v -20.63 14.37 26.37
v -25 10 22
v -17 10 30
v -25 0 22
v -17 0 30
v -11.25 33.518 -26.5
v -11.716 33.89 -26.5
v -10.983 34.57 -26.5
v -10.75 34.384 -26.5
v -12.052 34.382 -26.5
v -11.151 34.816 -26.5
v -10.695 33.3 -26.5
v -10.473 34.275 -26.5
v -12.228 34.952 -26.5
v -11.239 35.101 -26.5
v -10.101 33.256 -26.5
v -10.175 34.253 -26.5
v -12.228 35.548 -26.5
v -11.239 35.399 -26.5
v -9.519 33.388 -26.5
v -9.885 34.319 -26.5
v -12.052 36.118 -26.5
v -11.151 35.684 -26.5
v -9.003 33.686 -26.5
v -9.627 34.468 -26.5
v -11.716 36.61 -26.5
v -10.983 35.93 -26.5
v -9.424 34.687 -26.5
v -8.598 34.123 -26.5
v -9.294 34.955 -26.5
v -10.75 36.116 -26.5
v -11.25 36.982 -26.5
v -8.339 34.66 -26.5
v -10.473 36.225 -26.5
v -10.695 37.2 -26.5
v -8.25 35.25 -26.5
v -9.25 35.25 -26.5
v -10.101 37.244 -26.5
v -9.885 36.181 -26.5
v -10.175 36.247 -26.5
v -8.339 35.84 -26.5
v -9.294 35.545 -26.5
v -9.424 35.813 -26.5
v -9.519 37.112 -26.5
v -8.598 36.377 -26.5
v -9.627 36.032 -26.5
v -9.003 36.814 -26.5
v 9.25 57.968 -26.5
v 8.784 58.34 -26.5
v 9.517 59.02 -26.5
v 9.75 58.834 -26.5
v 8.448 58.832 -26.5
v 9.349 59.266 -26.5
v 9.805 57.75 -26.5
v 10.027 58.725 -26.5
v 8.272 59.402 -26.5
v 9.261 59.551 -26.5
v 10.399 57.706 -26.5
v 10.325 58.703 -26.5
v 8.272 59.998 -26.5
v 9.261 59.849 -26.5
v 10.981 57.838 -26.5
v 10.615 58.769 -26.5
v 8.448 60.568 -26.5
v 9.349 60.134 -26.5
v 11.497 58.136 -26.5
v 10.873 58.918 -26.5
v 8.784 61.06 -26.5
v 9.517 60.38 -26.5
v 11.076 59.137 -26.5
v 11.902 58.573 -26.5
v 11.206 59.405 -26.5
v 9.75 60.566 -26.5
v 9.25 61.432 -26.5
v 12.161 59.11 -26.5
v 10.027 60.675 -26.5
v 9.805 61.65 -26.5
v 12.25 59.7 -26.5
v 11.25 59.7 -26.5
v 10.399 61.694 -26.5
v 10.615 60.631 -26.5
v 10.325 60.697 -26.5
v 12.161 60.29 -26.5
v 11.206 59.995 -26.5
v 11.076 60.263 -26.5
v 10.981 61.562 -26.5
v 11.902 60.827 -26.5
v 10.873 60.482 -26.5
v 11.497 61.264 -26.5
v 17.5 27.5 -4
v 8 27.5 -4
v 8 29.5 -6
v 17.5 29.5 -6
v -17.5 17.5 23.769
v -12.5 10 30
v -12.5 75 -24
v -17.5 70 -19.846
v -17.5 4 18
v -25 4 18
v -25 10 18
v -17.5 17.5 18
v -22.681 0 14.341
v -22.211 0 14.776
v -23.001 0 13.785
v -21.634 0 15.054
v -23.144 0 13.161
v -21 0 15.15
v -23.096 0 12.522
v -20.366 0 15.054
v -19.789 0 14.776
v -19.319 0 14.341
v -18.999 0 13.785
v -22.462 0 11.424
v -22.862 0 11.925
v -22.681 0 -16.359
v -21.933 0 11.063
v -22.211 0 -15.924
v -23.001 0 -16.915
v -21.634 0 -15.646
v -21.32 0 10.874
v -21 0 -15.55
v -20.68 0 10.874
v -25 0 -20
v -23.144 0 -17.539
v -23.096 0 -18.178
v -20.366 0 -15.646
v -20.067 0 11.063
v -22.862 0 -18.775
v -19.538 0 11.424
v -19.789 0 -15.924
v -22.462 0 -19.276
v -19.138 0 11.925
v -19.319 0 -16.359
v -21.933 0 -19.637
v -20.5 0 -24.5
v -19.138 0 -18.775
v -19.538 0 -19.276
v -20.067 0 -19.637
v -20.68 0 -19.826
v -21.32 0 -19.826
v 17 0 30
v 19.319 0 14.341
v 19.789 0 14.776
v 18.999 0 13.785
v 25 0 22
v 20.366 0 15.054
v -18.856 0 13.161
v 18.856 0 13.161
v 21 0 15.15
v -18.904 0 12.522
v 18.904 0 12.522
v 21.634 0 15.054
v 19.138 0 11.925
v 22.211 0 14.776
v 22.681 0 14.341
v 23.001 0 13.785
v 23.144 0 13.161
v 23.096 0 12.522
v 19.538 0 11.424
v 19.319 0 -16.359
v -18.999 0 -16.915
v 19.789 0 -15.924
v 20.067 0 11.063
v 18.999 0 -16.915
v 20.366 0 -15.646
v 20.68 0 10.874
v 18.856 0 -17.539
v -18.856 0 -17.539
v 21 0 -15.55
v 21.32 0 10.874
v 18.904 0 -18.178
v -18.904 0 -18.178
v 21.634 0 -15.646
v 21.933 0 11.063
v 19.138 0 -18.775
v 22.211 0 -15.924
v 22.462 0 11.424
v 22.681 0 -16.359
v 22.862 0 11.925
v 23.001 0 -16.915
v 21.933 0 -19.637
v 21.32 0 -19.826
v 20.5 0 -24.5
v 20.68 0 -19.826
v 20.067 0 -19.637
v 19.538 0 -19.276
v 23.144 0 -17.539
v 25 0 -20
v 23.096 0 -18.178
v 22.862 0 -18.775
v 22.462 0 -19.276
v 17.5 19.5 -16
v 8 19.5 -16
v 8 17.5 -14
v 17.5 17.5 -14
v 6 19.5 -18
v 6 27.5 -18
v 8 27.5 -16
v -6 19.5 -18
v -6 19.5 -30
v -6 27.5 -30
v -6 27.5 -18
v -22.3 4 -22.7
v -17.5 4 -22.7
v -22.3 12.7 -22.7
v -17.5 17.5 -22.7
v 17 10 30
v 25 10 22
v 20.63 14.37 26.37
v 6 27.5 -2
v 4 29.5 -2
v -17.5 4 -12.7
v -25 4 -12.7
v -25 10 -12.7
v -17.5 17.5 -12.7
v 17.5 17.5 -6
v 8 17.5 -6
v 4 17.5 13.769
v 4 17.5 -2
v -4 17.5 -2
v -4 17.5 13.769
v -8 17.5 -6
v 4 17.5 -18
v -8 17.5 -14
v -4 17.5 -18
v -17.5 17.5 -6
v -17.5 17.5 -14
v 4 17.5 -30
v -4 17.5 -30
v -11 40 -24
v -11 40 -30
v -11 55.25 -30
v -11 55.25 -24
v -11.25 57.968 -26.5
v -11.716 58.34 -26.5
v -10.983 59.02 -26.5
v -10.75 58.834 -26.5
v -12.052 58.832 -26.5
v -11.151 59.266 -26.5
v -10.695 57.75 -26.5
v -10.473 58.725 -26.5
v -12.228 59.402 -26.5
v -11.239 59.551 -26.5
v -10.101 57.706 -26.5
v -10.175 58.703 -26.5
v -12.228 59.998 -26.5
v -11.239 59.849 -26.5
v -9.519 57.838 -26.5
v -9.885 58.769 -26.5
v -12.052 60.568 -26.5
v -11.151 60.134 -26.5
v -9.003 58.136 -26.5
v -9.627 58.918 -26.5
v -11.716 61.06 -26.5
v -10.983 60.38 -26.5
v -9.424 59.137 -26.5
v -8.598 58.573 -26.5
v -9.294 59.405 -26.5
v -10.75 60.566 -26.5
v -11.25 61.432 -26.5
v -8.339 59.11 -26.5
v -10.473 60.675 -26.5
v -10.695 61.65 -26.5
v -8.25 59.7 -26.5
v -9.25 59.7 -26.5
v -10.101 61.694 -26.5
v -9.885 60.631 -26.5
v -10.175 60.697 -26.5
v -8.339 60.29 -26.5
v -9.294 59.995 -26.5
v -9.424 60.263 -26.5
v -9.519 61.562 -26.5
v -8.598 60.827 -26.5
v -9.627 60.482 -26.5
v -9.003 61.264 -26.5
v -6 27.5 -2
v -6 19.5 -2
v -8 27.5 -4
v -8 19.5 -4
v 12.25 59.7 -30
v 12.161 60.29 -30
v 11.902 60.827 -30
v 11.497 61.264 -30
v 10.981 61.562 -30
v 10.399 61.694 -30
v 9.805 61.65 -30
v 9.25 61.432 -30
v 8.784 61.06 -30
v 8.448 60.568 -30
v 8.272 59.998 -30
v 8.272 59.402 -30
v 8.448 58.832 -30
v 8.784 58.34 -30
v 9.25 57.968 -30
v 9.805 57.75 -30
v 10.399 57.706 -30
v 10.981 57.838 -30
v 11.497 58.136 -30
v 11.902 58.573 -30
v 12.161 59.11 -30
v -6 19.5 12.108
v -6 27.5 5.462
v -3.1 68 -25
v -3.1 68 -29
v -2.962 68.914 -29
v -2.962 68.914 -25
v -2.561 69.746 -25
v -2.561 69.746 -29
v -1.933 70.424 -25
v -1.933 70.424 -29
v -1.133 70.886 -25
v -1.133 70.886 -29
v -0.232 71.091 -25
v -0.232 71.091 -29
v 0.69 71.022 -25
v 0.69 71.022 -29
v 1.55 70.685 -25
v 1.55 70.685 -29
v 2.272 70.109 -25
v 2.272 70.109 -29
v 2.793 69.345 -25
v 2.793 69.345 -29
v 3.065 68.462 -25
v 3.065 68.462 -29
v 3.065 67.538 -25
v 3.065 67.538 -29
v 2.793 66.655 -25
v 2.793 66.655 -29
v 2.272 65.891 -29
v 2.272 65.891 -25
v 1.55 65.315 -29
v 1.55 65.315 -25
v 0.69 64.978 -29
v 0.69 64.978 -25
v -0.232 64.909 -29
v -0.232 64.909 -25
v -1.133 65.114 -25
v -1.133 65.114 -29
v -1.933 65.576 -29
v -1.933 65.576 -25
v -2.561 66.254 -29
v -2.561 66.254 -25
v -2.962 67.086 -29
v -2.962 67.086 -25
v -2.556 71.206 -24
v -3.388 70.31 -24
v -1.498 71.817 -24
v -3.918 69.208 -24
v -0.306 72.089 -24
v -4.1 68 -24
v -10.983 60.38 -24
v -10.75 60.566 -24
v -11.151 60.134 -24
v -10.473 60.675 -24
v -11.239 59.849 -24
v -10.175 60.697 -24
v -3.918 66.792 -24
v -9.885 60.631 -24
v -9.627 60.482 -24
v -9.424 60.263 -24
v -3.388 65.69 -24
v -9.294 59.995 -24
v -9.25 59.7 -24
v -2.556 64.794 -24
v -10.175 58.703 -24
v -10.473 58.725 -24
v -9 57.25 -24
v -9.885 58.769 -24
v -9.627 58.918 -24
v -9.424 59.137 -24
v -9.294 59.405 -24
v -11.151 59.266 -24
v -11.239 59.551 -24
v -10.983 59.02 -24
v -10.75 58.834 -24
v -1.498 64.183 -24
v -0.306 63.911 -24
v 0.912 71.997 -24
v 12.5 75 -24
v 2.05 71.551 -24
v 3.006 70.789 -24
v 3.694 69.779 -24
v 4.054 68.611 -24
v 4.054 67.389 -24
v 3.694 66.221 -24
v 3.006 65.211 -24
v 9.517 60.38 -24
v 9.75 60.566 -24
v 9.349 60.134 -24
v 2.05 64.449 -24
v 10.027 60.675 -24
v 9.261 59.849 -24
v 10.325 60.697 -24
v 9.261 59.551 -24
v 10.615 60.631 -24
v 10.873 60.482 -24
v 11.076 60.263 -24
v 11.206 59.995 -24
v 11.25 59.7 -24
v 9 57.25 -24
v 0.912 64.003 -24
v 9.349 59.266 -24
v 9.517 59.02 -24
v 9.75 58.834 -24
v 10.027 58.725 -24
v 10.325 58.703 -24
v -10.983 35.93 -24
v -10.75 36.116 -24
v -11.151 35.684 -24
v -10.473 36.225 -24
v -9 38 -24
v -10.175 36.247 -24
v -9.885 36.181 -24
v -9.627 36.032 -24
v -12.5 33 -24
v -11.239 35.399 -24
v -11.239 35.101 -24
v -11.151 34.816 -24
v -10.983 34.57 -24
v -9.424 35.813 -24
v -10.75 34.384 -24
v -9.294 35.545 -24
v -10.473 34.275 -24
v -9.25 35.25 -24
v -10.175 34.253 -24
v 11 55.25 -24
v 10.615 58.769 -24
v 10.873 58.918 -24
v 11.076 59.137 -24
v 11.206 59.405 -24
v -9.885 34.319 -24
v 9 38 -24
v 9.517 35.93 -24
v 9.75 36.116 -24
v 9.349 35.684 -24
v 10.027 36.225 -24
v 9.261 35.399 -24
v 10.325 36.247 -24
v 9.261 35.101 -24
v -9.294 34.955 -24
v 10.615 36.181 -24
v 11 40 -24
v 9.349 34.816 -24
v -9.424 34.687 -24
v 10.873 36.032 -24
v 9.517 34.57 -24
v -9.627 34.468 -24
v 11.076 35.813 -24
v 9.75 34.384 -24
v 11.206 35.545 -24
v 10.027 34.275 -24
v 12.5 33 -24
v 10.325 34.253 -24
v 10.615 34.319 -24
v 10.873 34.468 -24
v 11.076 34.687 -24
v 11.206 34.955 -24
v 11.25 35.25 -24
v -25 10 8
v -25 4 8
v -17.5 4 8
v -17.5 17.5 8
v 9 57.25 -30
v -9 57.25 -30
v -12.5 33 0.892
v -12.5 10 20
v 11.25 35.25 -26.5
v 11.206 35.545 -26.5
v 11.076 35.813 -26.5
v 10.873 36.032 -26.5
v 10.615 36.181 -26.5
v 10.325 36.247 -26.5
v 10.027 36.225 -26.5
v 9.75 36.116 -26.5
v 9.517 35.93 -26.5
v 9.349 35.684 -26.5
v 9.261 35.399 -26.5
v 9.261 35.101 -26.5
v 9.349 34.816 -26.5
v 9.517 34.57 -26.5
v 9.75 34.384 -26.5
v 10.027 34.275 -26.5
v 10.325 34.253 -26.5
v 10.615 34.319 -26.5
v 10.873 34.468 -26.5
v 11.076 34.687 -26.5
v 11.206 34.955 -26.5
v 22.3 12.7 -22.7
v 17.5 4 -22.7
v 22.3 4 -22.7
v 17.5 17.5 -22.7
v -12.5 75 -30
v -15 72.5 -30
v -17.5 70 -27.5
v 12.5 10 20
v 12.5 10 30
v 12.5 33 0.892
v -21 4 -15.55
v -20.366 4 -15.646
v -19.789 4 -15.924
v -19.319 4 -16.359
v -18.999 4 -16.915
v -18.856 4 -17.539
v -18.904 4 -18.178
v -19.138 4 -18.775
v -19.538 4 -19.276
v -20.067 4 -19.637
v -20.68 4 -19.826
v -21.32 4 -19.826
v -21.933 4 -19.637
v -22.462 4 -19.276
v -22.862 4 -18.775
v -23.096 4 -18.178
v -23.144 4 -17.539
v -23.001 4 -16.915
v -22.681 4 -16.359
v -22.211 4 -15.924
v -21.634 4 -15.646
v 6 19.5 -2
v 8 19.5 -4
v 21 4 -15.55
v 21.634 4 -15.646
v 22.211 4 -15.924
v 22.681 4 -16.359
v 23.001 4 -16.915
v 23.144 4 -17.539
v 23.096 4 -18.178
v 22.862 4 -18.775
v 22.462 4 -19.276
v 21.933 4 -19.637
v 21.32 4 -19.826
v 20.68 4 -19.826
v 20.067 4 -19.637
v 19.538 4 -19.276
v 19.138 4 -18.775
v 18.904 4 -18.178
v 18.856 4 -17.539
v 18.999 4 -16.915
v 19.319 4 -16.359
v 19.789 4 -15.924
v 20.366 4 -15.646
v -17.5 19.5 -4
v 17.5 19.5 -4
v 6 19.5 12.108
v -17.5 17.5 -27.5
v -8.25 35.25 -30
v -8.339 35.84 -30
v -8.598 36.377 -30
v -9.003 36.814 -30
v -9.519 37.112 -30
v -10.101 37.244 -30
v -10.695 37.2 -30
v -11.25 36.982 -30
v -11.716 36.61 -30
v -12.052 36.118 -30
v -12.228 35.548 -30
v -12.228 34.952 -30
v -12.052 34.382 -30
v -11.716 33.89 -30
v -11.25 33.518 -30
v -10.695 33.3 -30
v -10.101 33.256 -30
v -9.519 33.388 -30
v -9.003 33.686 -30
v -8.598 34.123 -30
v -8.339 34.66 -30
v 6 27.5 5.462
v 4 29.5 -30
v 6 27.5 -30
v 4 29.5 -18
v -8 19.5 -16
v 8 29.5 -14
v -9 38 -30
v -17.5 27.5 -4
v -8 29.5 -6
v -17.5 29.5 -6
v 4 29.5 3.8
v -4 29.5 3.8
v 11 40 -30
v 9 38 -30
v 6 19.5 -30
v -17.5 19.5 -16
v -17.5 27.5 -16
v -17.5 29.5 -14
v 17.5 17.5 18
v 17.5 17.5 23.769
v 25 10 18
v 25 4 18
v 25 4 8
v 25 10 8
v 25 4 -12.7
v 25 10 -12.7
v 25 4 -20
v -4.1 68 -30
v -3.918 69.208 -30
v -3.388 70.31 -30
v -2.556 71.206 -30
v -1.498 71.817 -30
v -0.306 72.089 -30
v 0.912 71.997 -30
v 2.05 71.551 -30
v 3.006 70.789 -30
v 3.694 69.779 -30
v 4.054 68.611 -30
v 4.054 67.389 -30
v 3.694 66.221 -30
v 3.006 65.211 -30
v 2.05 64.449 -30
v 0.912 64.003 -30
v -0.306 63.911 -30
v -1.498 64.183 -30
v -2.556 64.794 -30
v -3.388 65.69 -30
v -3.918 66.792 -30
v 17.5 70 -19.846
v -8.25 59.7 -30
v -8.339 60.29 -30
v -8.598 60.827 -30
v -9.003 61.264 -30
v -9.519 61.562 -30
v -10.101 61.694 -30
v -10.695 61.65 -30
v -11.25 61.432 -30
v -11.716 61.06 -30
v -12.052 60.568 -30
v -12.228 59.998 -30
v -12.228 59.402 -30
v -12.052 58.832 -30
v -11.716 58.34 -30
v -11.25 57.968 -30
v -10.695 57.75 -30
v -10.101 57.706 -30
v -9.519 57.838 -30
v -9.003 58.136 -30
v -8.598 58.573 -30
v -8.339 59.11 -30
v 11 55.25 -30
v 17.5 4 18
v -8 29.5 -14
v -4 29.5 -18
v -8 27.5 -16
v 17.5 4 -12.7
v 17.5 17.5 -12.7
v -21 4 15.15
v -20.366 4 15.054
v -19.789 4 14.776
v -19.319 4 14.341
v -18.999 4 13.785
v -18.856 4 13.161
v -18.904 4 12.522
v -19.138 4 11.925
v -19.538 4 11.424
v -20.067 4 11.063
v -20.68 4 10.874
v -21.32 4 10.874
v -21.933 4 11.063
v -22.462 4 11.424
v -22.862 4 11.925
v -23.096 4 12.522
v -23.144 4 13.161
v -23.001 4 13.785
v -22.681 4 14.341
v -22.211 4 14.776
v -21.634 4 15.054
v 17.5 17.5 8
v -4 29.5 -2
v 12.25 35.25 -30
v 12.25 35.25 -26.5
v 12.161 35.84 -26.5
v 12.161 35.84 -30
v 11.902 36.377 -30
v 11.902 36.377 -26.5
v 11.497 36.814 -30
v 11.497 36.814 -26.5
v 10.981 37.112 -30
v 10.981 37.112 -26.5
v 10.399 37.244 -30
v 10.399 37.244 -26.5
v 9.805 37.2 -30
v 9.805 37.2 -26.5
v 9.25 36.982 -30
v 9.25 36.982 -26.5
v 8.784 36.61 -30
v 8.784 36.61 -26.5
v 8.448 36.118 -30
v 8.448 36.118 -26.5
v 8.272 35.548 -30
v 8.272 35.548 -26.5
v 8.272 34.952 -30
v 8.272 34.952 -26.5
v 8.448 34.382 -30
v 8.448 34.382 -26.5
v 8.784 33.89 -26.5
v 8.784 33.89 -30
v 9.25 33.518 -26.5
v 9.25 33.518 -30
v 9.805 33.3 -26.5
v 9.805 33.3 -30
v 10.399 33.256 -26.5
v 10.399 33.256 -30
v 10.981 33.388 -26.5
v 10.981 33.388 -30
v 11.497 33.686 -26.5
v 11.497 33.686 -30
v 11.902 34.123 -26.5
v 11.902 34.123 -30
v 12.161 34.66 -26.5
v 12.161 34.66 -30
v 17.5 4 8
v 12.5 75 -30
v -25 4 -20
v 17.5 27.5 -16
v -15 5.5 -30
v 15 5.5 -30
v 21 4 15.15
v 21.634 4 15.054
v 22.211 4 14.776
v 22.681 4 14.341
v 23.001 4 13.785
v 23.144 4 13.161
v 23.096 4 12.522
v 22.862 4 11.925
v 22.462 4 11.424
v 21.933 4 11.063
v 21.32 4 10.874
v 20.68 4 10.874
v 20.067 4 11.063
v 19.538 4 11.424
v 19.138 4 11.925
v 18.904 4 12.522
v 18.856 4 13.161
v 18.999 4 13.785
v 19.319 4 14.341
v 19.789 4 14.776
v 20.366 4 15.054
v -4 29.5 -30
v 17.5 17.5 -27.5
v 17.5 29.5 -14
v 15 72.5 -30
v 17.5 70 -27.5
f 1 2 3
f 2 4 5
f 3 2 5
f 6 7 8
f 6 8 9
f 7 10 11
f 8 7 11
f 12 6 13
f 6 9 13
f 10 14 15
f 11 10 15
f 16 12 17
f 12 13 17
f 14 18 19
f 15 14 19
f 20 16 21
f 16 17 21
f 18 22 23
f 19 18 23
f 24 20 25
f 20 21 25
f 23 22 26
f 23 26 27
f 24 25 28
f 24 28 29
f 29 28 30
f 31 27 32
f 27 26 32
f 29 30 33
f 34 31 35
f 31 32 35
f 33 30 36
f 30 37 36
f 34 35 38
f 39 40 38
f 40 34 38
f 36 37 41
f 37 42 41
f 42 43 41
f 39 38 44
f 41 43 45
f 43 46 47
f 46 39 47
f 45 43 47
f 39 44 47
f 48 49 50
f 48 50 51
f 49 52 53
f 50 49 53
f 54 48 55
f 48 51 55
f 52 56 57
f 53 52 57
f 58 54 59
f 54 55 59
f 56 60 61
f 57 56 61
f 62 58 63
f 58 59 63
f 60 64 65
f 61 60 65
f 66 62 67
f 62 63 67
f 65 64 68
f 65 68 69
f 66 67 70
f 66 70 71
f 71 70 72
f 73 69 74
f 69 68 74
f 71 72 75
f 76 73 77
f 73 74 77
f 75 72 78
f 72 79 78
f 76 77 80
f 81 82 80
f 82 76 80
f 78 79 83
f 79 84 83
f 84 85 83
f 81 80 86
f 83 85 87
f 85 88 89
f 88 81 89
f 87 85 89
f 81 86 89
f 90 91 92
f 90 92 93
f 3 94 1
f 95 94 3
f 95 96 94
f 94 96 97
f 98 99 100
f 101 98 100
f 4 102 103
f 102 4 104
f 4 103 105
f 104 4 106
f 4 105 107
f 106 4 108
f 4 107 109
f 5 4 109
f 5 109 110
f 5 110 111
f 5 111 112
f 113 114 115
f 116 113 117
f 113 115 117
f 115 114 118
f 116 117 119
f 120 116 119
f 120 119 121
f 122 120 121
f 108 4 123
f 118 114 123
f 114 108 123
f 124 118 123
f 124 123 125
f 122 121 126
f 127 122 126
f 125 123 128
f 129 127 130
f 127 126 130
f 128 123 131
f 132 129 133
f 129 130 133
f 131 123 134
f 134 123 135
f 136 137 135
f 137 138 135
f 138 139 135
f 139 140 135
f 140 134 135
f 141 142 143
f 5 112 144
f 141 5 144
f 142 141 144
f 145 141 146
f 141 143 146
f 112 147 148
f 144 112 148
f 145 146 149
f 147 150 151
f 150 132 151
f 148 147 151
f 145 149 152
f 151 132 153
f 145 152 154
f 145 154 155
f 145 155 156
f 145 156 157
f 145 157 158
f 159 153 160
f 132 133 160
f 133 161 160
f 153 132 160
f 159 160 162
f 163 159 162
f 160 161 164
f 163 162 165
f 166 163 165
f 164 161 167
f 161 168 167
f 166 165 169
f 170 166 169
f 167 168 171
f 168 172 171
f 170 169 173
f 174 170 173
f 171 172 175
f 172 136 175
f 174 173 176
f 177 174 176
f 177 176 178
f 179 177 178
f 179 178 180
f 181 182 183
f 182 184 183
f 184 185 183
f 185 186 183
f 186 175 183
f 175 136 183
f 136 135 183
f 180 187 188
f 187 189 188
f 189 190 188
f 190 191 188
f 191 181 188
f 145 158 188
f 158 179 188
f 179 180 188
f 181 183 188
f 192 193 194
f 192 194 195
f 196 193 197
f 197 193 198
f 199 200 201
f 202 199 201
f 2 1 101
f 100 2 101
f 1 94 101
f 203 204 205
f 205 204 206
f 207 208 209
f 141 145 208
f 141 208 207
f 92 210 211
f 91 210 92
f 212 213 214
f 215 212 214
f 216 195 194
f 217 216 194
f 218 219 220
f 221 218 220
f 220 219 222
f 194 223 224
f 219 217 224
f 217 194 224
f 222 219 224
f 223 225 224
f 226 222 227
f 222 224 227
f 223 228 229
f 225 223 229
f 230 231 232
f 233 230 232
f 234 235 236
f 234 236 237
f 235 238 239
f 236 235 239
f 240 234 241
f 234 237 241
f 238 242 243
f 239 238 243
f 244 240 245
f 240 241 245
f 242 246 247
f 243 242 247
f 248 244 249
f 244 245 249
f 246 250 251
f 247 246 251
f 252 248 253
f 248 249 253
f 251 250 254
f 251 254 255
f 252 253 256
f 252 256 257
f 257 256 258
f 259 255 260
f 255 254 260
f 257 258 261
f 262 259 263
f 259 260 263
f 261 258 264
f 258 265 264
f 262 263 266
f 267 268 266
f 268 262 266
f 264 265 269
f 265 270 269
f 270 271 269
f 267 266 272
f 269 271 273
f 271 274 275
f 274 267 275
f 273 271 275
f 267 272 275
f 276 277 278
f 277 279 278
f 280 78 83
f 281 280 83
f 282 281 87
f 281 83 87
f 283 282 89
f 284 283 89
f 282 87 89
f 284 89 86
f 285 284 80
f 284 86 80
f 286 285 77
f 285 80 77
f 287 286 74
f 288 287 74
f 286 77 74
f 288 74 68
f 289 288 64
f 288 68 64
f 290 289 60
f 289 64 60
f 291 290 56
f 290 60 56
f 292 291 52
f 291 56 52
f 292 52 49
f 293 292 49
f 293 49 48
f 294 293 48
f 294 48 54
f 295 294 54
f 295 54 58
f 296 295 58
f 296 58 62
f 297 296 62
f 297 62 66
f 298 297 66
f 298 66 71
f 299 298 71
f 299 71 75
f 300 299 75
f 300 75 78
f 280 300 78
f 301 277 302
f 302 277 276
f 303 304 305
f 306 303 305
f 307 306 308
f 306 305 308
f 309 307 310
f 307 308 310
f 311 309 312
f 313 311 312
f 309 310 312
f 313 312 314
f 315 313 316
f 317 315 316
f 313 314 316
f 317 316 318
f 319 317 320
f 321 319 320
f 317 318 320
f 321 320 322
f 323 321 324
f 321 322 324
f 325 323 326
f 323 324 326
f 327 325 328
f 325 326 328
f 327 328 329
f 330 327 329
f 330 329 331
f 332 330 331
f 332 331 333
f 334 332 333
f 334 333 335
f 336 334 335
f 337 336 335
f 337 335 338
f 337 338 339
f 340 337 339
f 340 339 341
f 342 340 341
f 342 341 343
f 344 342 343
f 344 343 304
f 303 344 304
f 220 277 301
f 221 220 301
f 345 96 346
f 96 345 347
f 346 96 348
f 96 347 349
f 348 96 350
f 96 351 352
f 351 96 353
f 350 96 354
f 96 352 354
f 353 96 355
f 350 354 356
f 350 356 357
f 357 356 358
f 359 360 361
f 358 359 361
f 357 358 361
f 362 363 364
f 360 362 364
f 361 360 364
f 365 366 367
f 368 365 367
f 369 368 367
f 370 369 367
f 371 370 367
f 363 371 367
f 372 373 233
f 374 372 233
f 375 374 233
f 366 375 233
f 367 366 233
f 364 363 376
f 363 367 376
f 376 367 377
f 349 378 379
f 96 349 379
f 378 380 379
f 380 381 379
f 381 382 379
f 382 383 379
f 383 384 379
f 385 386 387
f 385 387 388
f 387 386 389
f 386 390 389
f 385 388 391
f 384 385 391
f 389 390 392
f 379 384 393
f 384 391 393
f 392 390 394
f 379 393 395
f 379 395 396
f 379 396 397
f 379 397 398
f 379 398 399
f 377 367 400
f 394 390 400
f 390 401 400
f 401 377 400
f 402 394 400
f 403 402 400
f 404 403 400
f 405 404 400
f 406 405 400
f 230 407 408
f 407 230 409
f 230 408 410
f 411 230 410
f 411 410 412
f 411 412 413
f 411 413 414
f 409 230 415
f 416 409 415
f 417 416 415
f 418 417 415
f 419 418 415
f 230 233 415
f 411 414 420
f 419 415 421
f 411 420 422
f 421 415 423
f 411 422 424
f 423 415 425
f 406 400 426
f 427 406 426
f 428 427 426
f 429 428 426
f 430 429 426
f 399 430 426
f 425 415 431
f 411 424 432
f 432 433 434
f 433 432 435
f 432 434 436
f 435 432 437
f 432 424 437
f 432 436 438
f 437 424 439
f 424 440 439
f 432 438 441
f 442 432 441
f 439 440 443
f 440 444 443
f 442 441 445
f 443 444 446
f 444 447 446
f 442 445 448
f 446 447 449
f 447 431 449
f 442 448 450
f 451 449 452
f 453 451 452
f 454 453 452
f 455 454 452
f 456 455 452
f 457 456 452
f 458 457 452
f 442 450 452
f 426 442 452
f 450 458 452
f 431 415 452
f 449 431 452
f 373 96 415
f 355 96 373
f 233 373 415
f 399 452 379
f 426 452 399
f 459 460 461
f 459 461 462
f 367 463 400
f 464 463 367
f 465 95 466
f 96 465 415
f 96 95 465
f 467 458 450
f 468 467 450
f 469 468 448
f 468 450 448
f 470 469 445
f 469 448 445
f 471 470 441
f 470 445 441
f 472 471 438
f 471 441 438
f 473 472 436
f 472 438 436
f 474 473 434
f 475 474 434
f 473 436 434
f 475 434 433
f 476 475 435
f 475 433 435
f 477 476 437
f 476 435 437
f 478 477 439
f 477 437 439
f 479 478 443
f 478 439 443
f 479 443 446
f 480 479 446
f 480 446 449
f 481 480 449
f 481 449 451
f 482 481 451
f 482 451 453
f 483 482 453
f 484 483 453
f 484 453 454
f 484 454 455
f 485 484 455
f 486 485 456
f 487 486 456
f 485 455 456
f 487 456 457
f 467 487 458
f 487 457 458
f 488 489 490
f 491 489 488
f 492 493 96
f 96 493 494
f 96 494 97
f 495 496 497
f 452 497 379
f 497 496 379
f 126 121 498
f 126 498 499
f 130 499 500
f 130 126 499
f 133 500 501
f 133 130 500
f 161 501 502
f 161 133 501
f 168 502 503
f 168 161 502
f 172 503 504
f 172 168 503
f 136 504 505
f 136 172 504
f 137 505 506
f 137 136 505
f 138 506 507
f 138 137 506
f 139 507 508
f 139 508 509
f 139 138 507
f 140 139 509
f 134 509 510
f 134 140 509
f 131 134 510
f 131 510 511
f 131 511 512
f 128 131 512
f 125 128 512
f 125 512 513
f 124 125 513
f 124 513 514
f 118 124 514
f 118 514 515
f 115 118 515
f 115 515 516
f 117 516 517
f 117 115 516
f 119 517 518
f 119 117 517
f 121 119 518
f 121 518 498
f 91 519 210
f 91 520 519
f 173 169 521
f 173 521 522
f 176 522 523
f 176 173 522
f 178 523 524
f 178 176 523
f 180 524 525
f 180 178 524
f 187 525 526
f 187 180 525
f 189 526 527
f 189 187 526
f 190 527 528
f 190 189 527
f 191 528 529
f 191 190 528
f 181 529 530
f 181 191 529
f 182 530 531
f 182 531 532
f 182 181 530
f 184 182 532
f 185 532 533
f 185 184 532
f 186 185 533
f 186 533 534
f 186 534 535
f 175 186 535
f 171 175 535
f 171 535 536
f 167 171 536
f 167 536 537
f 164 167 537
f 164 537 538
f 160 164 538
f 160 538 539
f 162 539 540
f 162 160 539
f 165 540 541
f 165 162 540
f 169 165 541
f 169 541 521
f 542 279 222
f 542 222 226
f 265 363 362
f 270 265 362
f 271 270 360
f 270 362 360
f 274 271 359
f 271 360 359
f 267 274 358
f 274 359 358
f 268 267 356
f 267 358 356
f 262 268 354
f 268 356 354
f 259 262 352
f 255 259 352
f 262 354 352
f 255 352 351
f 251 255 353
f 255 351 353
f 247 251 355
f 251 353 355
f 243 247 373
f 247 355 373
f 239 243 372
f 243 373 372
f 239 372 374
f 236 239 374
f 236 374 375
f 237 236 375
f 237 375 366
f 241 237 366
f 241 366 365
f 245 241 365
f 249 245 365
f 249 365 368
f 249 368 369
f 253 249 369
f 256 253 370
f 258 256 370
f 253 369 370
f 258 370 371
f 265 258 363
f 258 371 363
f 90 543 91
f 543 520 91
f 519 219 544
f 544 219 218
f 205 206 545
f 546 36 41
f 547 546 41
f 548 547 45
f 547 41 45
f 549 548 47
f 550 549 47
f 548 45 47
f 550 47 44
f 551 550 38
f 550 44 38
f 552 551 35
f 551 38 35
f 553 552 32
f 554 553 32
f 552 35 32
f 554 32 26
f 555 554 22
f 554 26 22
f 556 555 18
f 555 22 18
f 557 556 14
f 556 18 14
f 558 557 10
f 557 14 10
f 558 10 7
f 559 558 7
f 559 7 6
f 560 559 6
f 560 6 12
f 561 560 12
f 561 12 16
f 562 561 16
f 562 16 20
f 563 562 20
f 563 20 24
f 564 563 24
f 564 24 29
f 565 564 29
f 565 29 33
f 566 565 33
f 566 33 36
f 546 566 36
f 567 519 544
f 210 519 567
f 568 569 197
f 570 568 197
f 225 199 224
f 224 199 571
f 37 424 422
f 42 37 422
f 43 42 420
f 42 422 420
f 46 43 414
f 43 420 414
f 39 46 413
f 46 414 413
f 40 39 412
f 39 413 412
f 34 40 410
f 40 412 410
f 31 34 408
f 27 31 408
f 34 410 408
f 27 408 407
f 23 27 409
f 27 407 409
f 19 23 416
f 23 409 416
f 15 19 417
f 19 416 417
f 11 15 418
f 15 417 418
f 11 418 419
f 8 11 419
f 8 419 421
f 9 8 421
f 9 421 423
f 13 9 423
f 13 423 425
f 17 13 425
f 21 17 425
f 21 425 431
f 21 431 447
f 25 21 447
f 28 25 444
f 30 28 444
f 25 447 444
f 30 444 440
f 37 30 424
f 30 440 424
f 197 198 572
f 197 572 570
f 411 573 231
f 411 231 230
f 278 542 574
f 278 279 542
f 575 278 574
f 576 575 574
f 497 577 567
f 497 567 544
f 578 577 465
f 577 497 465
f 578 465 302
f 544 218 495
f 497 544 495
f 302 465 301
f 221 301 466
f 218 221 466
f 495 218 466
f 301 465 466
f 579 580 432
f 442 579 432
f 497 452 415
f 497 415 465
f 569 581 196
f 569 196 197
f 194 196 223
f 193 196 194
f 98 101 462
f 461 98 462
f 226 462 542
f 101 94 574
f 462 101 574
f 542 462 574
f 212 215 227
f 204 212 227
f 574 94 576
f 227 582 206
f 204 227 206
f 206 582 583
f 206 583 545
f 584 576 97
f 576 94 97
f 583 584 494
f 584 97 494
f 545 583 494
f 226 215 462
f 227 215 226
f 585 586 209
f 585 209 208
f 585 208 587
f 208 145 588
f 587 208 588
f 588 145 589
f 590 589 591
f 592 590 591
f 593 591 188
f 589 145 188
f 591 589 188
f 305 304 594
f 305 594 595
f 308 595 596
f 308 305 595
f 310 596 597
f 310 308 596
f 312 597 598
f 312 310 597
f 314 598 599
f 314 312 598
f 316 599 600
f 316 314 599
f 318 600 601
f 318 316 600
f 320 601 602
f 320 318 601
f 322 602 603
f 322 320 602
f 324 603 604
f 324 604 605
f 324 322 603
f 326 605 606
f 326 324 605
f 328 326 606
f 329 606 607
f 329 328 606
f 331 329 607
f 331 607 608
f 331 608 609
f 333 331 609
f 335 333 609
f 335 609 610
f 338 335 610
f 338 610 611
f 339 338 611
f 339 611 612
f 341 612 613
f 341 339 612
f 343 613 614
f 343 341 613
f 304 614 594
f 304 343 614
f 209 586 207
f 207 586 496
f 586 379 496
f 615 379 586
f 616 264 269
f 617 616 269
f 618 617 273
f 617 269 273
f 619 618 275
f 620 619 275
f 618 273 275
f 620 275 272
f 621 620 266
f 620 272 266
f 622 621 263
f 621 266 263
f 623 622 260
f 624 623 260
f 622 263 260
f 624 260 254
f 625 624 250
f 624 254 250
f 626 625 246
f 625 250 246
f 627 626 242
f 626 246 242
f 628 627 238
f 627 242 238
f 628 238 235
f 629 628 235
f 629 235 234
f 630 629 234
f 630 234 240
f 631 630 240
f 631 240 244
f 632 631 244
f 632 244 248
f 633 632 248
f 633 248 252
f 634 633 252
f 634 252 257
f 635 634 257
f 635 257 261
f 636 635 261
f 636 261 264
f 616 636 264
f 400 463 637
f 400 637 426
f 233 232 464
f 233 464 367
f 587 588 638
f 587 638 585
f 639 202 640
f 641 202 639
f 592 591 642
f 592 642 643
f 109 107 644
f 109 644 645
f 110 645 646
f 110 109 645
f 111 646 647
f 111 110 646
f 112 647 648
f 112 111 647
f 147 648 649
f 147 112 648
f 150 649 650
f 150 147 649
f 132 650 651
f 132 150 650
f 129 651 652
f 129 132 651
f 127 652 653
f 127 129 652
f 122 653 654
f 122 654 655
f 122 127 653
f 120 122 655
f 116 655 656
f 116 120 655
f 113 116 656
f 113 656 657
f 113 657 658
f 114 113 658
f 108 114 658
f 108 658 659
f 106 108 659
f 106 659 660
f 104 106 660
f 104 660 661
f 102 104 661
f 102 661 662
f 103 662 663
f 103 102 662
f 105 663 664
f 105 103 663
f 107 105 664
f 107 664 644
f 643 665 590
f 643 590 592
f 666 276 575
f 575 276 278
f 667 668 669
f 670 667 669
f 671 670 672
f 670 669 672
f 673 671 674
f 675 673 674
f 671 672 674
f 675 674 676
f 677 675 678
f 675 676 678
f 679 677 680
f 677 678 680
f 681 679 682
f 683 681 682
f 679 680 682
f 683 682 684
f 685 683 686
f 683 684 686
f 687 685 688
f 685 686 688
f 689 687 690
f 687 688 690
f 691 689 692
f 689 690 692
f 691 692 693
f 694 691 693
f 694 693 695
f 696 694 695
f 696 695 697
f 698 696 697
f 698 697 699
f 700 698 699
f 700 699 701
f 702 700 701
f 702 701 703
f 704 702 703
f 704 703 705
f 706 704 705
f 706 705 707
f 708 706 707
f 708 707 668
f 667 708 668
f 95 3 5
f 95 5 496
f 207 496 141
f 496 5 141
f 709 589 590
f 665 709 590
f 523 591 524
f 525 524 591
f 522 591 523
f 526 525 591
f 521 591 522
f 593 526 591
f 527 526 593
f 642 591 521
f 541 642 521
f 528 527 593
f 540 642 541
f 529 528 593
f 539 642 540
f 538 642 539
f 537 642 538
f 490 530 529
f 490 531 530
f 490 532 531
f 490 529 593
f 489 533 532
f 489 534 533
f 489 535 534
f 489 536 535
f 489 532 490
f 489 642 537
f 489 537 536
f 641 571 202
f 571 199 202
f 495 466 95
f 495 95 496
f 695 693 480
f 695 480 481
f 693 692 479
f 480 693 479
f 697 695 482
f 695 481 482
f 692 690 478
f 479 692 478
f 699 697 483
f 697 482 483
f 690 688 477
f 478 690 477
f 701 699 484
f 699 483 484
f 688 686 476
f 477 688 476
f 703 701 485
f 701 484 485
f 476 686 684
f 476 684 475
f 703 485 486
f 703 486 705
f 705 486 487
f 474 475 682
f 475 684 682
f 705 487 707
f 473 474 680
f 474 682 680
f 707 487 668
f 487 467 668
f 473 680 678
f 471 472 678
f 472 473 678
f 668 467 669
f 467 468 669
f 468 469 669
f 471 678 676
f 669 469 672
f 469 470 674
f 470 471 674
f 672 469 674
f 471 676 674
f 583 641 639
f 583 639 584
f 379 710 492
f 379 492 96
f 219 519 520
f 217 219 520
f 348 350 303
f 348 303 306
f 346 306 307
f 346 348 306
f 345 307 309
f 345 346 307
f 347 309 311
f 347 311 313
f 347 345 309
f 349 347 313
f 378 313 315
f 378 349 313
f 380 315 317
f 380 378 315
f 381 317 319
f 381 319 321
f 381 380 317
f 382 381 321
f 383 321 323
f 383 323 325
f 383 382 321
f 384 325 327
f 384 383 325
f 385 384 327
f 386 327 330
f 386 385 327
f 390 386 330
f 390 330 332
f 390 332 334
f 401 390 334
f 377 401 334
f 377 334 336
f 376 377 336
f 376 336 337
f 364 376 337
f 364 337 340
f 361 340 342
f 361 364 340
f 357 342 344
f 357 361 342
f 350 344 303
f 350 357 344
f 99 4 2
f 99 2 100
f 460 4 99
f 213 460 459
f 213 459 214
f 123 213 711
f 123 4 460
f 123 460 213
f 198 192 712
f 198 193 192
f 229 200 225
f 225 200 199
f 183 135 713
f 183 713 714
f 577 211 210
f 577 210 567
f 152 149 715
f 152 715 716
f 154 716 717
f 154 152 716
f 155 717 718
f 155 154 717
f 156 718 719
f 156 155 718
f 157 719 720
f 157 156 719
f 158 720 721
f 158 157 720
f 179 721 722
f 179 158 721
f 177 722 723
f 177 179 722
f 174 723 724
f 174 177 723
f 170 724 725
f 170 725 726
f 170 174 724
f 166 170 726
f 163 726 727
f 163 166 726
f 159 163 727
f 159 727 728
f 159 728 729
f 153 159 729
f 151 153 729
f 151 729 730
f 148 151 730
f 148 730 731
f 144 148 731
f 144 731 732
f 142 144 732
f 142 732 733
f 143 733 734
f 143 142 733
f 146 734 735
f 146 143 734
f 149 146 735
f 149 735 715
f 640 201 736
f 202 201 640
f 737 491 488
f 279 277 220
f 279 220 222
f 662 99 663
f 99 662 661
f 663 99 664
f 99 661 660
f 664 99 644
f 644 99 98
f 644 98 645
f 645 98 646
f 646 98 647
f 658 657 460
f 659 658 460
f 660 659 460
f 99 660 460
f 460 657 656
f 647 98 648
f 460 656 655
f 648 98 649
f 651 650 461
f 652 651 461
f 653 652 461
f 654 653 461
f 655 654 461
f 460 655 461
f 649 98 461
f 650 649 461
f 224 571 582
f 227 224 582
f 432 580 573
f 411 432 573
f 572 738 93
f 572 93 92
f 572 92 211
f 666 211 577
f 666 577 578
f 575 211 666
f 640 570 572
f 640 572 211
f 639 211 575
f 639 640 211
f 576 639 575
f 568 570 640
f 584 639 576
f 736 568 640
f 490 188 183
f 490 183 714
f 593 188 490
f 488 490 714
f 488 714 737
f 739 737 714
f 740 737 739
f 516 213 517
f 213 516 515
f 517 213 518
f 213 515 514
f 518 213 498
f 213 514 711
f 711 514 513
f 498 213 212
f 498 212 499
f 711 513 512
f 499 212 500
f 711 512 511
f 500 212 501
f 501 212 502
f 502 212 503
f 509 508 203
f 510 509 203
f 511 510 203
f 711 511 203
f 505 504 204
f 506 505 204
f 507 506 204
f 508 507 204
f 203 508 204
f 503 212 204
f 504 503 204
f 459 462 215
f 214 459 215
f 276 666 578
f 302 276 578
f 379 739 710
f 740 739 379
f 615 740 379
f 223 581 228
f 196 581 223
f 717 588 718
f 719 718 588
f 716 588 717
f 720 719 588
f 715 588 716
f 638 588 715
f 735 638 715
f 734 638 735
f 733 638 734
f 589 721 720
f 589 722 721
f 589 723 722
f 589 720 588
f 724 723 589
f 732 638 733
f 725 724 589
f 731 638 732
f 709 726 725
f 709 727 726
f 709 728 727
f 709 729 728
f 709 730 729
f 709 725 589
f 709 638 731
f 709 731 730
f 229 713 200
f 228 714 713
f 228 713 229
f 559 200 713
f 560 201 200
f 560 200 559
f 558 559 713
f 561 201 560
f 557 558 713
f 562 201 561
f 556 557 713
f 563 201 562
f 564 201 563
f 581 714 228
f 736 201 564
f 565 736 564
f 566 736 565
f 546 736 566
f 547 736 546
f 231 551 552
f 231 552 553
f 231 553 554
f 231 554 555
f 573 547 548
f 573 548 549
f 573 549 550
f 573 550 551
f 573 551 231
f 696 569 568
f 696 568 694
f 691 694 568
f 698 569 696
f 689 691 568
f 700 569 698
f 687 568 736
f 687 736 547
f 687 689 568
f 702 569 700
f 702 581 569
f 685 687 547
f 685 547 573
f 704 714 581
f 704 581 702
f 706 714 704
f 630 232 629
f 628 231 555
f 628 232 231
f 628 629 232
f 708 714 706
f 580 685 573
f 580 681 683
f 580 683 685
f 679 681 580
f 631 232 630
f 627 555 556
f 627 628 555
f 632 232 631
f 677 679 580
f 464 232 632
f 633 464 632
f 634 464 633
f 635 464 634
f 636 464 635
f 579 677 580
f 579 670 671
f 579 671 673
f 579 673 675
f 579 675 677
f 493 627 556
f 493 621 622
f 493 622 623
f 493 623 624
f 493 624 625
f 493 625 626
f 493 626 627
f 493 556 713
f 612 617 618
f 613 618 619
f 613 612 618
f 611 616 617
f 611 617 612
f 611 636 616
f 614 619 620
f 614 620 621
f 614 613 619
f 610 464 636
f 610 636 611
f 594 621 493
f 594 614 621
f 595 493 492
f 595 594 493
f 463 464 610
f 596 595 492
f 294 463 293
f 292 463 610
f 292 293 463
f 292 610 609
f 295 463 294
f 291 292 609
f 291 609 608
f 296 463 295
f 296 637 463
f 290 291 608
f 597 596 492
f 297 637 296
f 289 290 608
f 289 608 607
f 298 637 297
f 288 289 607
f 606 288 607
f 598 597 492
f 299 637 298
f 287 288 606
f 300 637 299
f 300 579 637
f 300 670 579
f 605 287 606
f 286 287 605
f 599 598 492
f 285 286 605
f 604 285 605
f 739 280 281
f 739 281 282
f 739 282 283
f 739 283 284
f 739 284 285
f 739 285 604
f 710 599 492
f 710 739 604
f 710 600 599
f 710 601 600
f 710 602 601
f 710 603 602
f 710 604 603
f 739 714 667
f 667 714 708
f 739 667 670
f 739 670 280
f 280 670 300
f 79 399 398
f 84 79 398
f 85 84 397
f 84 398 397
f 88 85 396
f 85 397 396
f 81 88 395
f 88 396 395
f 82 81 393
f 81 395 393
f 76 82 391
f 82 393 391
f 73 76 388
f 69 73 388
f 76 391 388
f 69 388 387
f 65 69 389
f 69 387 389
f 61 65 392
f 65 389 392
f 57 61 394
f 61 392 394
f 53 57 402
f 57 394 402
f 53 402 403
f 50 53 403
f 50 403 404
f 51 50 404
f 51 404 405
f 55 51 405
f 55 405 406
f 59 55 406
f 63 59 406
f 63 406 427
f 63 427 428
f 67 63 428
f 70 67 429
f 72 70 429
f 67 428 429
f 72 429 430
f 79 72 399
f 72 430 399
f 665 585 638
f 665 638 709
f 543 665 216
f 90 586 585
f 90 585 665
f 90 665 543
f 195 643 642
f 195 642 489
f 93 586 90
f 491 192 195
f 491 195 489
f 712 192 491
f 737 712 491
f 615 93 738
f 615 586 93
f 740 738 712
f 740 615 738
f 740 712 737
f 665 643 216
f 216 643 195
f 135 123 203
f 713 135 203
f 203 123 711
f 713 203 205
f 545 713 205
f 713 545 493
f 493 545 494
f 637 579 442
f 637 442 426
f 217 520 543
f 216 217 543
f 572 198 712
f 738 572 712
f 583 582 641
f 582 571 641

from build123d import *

# Parameters (mm, degrees)
SKETCH1_W           = 50
SKETCH1_H           = 60
BOSS_EXTRUDE1_DEPTH = 10
SKETCH2_R           = 2.15
CUT_EXTRUDE1_DEPTH  = 4
SKETCH5_W           = 25
SKETCH5_H           = 6
BOSS_EXTRUDE3_DEPTH = 65
CUT_EXTRUDE3_REACH  = 101.247
SKETCH6_W           = 22
SKETCH6_H           = 19.25
SKETCH7_R           = 1
CUT_EXTRUDE4_DEPTH  = 2.5
CUT_EXTRUDE5_REACH  = 99.171
SKETCH8_R           = 2
BOSS_EXTRUDE4_DEPTH = 5
CHAMFER1_SIZE       = 7.5
CHAMFER2_SIZE       = 10
CHAMFER4_SIZE       = 5.5
CHAMFER5_SIZE       = 5
CHAMFER7_SIZE       = 2
CUT_EXTRUDE6_REACH  = 101.247
SKETCH10_R          = 3.1
CHAMFER8_SIZE       = 1
BOSS_EXTRUDE5_REACH = 91.058
CHAMFER9_SIZE       = 8
CUT_EXTRUDE7_REACH  = 101.247
SKETCH12_W          = 12
SKETCH12_H          = 12
CUT_EXTRUDE9_REACH  = 88.522
SKETCH14_W          = 12
SKETCH14_H          = 12
CHAMFER11_SIZE      = 2
CUT_EXTRUDE11_REACH = 93.276
SKETCH16_W          = 10
SKETCH16_H          = 13.5
SKETCH17_W          = 10
SKETCH17_H          = 13.5
CUT_EXTRUDE12_DEPTH = 7.5


# Some blends are built 0.0001 mm under size
with BuildPart() as part:
    # Sketch1 → Boss-Extrude1 (new body)
    with BuildSketch(Plane(origin=(0, 0, 0), x_dir=(1, 0, 0), z_dir=(0, 1, 0))):
        Rectangle(SKETCH1_W, SKETCH1_H)
    extrude(amount=BOSS_EXTRUDE1_DEPTH)

    # Sketch2 → Cut-Extrude1 (cut)
    with BuildSketch(Plane(origin=(0, 0, 0), x_dir=(1, 0, 0), z_dir=(0, 1, 0))):
        with Locations(Location((-21, 17.7, 0), (0, 0, 270))):
            Circle(SKETCH2_R)
        with Locations(Location((-21, -13, 0), (0, 0, 270))):
            Circle(SKETCH2_R)
        with Locations(Location((21, 17.7, 0), (0, 0, 270))):
            Circle(SKETCH2_R)
        with Locations(Location((21, -13, 0), (0, 0, 270))):
            Circle(SKETCH2_R)
    extrude(amount=CUT_EXTRUDE1_DEPTH, mode=Mode.SUBTRACT)

    # Sketch5 → Boss-Extrude3 (add)
    with BuildSketch(Plane(origin=(0, 10, 0), x_dir=(1, 0, 0), z_dir=(0, 1, 0))):
        with Locations((0, 27)):
            Rectangle(SKETCH5_W, SKETCH5_H)
    extrude(amount=BOSS_EXTRUDE3_DEPTH)

    # Sketch6 → Cut-Extrude3 (cut, up to next)
    with BuildSketch(Plane(origin=(0, 0, -30), x_dir=(-1, 0, 0), z_dir=(0, 0, -1)), mode=Mode.PRIVATE) as cut_extrude3_sk1:
        with Locations((0, 47.625)):
            Rectangle(SKETCH6_W, SKETCH6_H)
    cut_extrude3_tool1 = extrude(cut_extrude3_sk1.sketch, amount=-CUT_EXTRUDE3_REACH, mode=Mode.PRIVATE) & part.part
    add(cut_extrude3_tool1.solids().sort_by_distance((0, 47.625, -30))[0], mode=Mode.SUBTRACT)

    # Sketch7 → Cut-Extrude4 (cut)
    with BuildSketch(Plane.XY.offset(-24)):
        with Locations((10.25, 35.25)):
            Circle(SKETCH7_R)
        with Locations((-10.25, 35.25)):
            Circle(SKETCH7_R)
        with Locations((-10.25, 59.7)):
            Circle(SKETCH7_R)
        with Locations((10.25, 59.7)):
            Circle(SKETCH7_R)
    extrude(amount=-CUT_EXTRUDE4_DEPTH, mode=Mode.SUBTRACT)

    # Sketch8 → Cut-Extrude5 (cut, up to next)
    with BuildSketch(Plane.XY.offset(-26.5), mode=Mode.PRIVATE) as cut_extrude5_sk1:
        with Locations((-10.25, 59.7)):
            Circle(SKETCH8_R)
    cut_extrude5_tool1 = extrude(cut_extrude5_sk1.sketch, amount=-CUT_EXTRUDE5_REACH, mode=Mode.PRIVATE) & part.part
    # Sketch8 → Cut-Extrude5 (cut, up to next)
    with BuildSketch(Plane.XY.offset(-26.5), mode=Mode.PRIVATE) as cut_extrude5_sk2:
        with Locations((10.25, 59.7)):
            Circle(SKETCH8_R)
    cut_extrude5_tool2 = extrude(cut_extrude5_sk2.sketch, amount=-CUT_EXTRUDE5_REACH, mode=Mode.PRIVATE) & part.part
    # Sketch8 → Cut-Extrude5 (cut, up to next)
    with BuildSketch(Plane.XY.offset(-26.5), mode=Mode.PRIVATE) as cut_extrude5_sk3:
        with Locations((10.25, 35.25)):
            Circle(SKETCH8_R)
    cut_extrude5_tool3 = extrude(cut_extrude5_sk3.sketch, amount=-CUT_EXTRUDE5_REACH, mode=Mode.PRIVATE) & part.part
    # Sketch8 → Cut-Extrude5 (cut, up to next)
    with BuildSketch(Plane.XY.offset(-26.5), mode=Mode.PRIVATE) as cut_extrude5_sk4:
        with Locations((-10.25, 35.25)):
            Circle(SKETCH8_R)
    cut_extrude5_tool4 = extrude(cut_extrude5_sk4.sketch, amount=-CUT_EXTRUDE5_REACH, mode=Mode.PRIVATE) & part.part
    add(cut_extrude5_tool1.solids().sort_by_distance((-10.25, 59.7, -26.5))[0], mode=Mode.SUBTRACT)
    add(cut_extrude5_tool2.solids().sort_by_distance((10.25, 59.7, -26.5))[0], mode=Mode.SUBTRACT)
    add(cut_extrude5_tool3.solids().sort_by_distance((10.25, 35.25, -26.5))[0], mode=Mode.SUBTRACT)
    add(cut_extrude5_tool4.solids().sort_by_distance((-10.25, 35.25, -26.5))[0], mode=Mode.SUBTRACT)

    # Sketch9 → Boss-Extrude4 (add)
    with BuildSketch(Plane(origin=(12.5, 0, 0), x_dir=(0, 0, -1), z_dir=(1, 0, 0))):
        Polygon((30, 75), (24, 75), (-30, 10), (30, 10), align=None)
    boss_extrude4 = extrude(amount=BOSS_EXTRUDE4_DEPTH)

    # Mirror1: Boss-Extrude4 across plane
    add(boss_extrude4.mirror(Plane(origin=(0, 0, 0), x_dir=(0, 0, 1), z_dir=(1, 0, 0))))

    # Chamfer1
    chamfer1_edges = [part.edges().sort_by_distance(p)[0] for p in [
        (17.5, 10, 0),
        (-17.5, 10, 0),
    ]]
    chamfer(chamfer1_edges, length=CHAMFER1_SIZE - 0.0001)  # a hair under: the kernel refuses the full size

    # Chamfer2
    chamfer2_edges = [part.edges().sort_by_distance(p)[0] for p in [
        (-25, 5, -30),
        (25, 5, -30),
    ]]
    chamfer(chamfer2_edges, length=CHAMFER2_SIZE)

    # Chamfer4
    chamfer4_edges = [part.edges().sort_by_distance(p)[0] for p in [
        (0, 0, -30),
    ]]
    chamfer(chamfer4_edges, length=CHAMFER4_SIZE)

    # Chamfer5
    chamfer5_edges = [part.edges().sort_by_distance(p)[0] for p in [
        (17.5, 75, -25.75),
        (-17.5, 75, -25.75),
    ]]
    chamfer(chamfer5_edges, length=CHAMFER5_SIZE)

    # Chamfer7
    chamfer7_edges = [part.edges().sort_by_distance(p)[0] for p in [
        (-11, 57.25, -27),
        (-11, 38, -27),
        (11, 38, -27),
        (11, 57.25, -27),
    ]]
    chamfer(chamfer7_edges, length=CHAMFER7_SIZE)

    # Sketch10 → Cut-Extrude6 (cut, up to next)
    with BuildSketch(Plane(origin=(0, 0, -30), x_dir=(-1, 0, 0), z_dir=(0, 0, -1)), mode=Mode.PRIVATE) as cut_extrude6_sk1:
        with Locations((0, 68)):
            Circle(SKETCH10_R)
    cut_extrude6_tool1 = extrude(cut_extrude6_sk1.sketch, amount=-CUT_EXTRUDE6_REACH, mode=Mode.PRIVATE) & part.part
    add(cut_extrude6_tool1.solids().sort_by_distance((0, 68, -30))[0], mode=Mode.SUBTRACT)

    # Chamfer8
    chamfer8_edges = [part.edges().sort_by_distance(p)[0] for p in [
        (3.1, 68, -30),
        (3.1, 68, -24),
    ]]
    chamfer(chamfer8_edges, length=CHAMFER8_SIZE)

    # Sketch11 → Boss-Extrude5 (add, up to next)
    with BuildSketch(Plane(origin=(-12.5, 0, 0), x_dir=(0, 0, -1), z_dir=(1, 0, 0)), mode=Mode.PRIVATE) as boss_extrude5_sk1:
        Polygon((-20, 10), (24, 10), (24, 33), (-0.892307692, 33), align=None)
    boss_extrude5_tool1 = extrude(boss_extrude5_sk1.sketch, amount=BOSS_EXTRUDE5_REACH, mode=Mode.PRIVATE) - part.part
    add(boss_extrude5_tool1.solids().sort_by_distance((-12.5, 20.436802, -6.335287))[0])

    # Chamfer9
    # the kernel refuses this chamfer: 8 mm, written as the material it takes off along each edge
    with BuildSketch(Plane(origin=(25, -20.573463904, 30), x_dir=(0.027495876610586487, 0, -0.9996219169112968), z_dir=(0, 1, 0))) as chamfer9_piece_1:
        Polygon((CHAMFER9_SIZE * 0.999621916911, CHAMFER9_SIZE * 0.0274958766106), (-CHAMFER9_SIZE * 0.0274958766106, CHAMFER9_SIZE * 0.999621916911), (0, 0), align=None)
    extrude(amount=51.146927807, mode=Mode.SUBTRACT)
    with BuildSketch(Plane(origin=(-25, -20.573463904, 30), x_dir=(-0.027495876610586487, 0, -0.9996219169112968), z_dir=(0, 1, 0))) as chamfer9_piece_2:
        Polygon((CHAMFER9_SIZE * 0.999621916911, -CHAMFER9_SIZE * 0.0274958766106), (-CHAMFER9_SIZE * 0.0274958766106, -CHAMFER9_SIZE * 0.999621916911), (0, 0), align=None)
    extrude(amount=51.146927807, mode=Mode.SUBTRACT)

    # Cut-Extrude7: up to this plane
    cut_extrude7_end = Plane(origin=(25.002, 33, 0.892307692), z_dir=(0, -0.6390196945354668, -0.7691903730519506))
    # Sketch12 → Cut-Extrude7 (cut, up to the surface)
    with BuildSketch(Plane(origin=(0, 0, -30), x_dir=(-1, 0, 0), z_dir=(0, 0, -1)), mode=Mode.PRIVATE) as cut_extrude7_sk1:
        with Locations((0, 23.5)):
            Rectangle(SKETCH12_W, SKETCH12_H)
    cut_extrude7_tool1 = split(extrude(cut_extrude7_sk1.sketch, amount=-CUT_EXTRUDE7_REACH, mode=Mode.PRIVATE), bisect_by=cut_extrude7_end, keep=Keep.BOTH, mode=Mode.PRIVATE)
    add(cut_extrude7_tool1.solids().sort_by_distance((0, 23.5, -30))[0], mode=Mode.SUBTRACT)

    # Sketch14 → Cut-Extrude9 (cut, up to next)
    with BuildSketch(Plane(origin=(-6, 0, 0), x_dir=(0, 0, -1), z_dir=(1, 0, 0)), mode=Mode.PRIVATE) as cut_extrude9_sk1:
        with Locations((10, 23.5)):
            Rectangle(SKETCH14_W, SKETCH14_H)
    cut_extrude9_tool1 = extrude(cut_extrude9_sk1.sketch, amount=-CUT_EXTRUDE9_REACH, mode=Mode.PRIVATE) & part.part
    cut_extrude9 = cut_extrude9_tool1.solids().sort_by_distance((-6, 23.5, -10))[0]
    add(cut_extrude9, mode=Mode.SUBTRACT)

    # Mirror2: Cut-Extrude9 across plane
    add(cut_extrude9.mirror(Plane(origin=(0, 0, 0), x_dir=(0, 0, 1), z_dir=(1, 0, 0))), mode=Mode.SUBTRACT)

    # Chamfer11
    chamfer11_edges = [part.edges().sort_by_distance(p)[0] for p in [
        (-6, 17.5, 4.884615385),
        (6, 17.5, 4.884615385),
        (6, 29.5, -0.1),
        (-6, 29.5, -0.1),
        (-6, 17.5, -23),
        (-6, 29.5, -23),
        (-11.75, 17.5, -16),
        (-11.75, 29.5, -16),
        (-11.75, 17.5, -4),
        (-11.75, 29.5, -4),
        (-6, 23.5, -16),
        (-6, 23.5, -4),
        (6, 29.5, -23),
        (6, 17.5, -23),
        (11.75, 17.5, -4),
        (11.75, 17.5, -16),
        (6, 23.5, -16),
        (11.75, 29.5, -16),
        (11.75, 29.5, -4),
        (6, 23.5, -4),
    ]]
    chamfer(chamfer11_edges, length=CHAMFER11_SIZE)

    # Sketch16 → Cut-Extrude11 (cut, up to next)
    with BuildSketch(Plane(origin=(17.5, 0, 0), x_dir=(0, 0, -1), z_dir=(1, 0, 0)), mode=Mode.PRIVATE) as cut_extrude11_sk1:
        with Locations((-13, 10.75)):
            Rectangle(SKETCH16_W, SKETCH16_H)
    cut_extrude11_tool1 = extrude(cut_extrude11_sk1.sketch, amount=CUT_EXTRUDE11_REACH, mode=Mode.PRIVATE) & part.part
    cut_extrude11 = cut_extrude11_tool1.solids().sort_by_distance((17.5, 10.75, 13))[0]
    add(cut_extrude11, mode=Mode.SUBTRACT)

    # Sketch17 → Cut-Extrude12 (cut)
    with BuildSketch(Plane(origin=(17.5, 0, 0), x_dir=(0, 0, -1), z_dir=(1, 0, 0))):
        with Locations((17.7, 10.75)):
            Rectangle(SKETCH17_W, SKETCH17_H)
    cut_extrude12 = extrude(amount=CUT_EXTRUDE12_DEPTH, mode=Mode.SUBTRACT)

    # Mirror4: Cut-Extrude11, Cut-Extrude12 across plane
    add(cut_extrude11.mirror(Plane(origin=(0, 0, 0), x_dir=(0, 0, 1), z_dir=(1, 0, 0))), mode=Mode.SUBTRACT)
    add(cut_extrude12.mirror(Plane(origin=(0, 0, 0), x_dir=(0, 0, 1), z_dir=(1, 0, 0))), mode=Mode.SUBTRACT)


solid = part.part
